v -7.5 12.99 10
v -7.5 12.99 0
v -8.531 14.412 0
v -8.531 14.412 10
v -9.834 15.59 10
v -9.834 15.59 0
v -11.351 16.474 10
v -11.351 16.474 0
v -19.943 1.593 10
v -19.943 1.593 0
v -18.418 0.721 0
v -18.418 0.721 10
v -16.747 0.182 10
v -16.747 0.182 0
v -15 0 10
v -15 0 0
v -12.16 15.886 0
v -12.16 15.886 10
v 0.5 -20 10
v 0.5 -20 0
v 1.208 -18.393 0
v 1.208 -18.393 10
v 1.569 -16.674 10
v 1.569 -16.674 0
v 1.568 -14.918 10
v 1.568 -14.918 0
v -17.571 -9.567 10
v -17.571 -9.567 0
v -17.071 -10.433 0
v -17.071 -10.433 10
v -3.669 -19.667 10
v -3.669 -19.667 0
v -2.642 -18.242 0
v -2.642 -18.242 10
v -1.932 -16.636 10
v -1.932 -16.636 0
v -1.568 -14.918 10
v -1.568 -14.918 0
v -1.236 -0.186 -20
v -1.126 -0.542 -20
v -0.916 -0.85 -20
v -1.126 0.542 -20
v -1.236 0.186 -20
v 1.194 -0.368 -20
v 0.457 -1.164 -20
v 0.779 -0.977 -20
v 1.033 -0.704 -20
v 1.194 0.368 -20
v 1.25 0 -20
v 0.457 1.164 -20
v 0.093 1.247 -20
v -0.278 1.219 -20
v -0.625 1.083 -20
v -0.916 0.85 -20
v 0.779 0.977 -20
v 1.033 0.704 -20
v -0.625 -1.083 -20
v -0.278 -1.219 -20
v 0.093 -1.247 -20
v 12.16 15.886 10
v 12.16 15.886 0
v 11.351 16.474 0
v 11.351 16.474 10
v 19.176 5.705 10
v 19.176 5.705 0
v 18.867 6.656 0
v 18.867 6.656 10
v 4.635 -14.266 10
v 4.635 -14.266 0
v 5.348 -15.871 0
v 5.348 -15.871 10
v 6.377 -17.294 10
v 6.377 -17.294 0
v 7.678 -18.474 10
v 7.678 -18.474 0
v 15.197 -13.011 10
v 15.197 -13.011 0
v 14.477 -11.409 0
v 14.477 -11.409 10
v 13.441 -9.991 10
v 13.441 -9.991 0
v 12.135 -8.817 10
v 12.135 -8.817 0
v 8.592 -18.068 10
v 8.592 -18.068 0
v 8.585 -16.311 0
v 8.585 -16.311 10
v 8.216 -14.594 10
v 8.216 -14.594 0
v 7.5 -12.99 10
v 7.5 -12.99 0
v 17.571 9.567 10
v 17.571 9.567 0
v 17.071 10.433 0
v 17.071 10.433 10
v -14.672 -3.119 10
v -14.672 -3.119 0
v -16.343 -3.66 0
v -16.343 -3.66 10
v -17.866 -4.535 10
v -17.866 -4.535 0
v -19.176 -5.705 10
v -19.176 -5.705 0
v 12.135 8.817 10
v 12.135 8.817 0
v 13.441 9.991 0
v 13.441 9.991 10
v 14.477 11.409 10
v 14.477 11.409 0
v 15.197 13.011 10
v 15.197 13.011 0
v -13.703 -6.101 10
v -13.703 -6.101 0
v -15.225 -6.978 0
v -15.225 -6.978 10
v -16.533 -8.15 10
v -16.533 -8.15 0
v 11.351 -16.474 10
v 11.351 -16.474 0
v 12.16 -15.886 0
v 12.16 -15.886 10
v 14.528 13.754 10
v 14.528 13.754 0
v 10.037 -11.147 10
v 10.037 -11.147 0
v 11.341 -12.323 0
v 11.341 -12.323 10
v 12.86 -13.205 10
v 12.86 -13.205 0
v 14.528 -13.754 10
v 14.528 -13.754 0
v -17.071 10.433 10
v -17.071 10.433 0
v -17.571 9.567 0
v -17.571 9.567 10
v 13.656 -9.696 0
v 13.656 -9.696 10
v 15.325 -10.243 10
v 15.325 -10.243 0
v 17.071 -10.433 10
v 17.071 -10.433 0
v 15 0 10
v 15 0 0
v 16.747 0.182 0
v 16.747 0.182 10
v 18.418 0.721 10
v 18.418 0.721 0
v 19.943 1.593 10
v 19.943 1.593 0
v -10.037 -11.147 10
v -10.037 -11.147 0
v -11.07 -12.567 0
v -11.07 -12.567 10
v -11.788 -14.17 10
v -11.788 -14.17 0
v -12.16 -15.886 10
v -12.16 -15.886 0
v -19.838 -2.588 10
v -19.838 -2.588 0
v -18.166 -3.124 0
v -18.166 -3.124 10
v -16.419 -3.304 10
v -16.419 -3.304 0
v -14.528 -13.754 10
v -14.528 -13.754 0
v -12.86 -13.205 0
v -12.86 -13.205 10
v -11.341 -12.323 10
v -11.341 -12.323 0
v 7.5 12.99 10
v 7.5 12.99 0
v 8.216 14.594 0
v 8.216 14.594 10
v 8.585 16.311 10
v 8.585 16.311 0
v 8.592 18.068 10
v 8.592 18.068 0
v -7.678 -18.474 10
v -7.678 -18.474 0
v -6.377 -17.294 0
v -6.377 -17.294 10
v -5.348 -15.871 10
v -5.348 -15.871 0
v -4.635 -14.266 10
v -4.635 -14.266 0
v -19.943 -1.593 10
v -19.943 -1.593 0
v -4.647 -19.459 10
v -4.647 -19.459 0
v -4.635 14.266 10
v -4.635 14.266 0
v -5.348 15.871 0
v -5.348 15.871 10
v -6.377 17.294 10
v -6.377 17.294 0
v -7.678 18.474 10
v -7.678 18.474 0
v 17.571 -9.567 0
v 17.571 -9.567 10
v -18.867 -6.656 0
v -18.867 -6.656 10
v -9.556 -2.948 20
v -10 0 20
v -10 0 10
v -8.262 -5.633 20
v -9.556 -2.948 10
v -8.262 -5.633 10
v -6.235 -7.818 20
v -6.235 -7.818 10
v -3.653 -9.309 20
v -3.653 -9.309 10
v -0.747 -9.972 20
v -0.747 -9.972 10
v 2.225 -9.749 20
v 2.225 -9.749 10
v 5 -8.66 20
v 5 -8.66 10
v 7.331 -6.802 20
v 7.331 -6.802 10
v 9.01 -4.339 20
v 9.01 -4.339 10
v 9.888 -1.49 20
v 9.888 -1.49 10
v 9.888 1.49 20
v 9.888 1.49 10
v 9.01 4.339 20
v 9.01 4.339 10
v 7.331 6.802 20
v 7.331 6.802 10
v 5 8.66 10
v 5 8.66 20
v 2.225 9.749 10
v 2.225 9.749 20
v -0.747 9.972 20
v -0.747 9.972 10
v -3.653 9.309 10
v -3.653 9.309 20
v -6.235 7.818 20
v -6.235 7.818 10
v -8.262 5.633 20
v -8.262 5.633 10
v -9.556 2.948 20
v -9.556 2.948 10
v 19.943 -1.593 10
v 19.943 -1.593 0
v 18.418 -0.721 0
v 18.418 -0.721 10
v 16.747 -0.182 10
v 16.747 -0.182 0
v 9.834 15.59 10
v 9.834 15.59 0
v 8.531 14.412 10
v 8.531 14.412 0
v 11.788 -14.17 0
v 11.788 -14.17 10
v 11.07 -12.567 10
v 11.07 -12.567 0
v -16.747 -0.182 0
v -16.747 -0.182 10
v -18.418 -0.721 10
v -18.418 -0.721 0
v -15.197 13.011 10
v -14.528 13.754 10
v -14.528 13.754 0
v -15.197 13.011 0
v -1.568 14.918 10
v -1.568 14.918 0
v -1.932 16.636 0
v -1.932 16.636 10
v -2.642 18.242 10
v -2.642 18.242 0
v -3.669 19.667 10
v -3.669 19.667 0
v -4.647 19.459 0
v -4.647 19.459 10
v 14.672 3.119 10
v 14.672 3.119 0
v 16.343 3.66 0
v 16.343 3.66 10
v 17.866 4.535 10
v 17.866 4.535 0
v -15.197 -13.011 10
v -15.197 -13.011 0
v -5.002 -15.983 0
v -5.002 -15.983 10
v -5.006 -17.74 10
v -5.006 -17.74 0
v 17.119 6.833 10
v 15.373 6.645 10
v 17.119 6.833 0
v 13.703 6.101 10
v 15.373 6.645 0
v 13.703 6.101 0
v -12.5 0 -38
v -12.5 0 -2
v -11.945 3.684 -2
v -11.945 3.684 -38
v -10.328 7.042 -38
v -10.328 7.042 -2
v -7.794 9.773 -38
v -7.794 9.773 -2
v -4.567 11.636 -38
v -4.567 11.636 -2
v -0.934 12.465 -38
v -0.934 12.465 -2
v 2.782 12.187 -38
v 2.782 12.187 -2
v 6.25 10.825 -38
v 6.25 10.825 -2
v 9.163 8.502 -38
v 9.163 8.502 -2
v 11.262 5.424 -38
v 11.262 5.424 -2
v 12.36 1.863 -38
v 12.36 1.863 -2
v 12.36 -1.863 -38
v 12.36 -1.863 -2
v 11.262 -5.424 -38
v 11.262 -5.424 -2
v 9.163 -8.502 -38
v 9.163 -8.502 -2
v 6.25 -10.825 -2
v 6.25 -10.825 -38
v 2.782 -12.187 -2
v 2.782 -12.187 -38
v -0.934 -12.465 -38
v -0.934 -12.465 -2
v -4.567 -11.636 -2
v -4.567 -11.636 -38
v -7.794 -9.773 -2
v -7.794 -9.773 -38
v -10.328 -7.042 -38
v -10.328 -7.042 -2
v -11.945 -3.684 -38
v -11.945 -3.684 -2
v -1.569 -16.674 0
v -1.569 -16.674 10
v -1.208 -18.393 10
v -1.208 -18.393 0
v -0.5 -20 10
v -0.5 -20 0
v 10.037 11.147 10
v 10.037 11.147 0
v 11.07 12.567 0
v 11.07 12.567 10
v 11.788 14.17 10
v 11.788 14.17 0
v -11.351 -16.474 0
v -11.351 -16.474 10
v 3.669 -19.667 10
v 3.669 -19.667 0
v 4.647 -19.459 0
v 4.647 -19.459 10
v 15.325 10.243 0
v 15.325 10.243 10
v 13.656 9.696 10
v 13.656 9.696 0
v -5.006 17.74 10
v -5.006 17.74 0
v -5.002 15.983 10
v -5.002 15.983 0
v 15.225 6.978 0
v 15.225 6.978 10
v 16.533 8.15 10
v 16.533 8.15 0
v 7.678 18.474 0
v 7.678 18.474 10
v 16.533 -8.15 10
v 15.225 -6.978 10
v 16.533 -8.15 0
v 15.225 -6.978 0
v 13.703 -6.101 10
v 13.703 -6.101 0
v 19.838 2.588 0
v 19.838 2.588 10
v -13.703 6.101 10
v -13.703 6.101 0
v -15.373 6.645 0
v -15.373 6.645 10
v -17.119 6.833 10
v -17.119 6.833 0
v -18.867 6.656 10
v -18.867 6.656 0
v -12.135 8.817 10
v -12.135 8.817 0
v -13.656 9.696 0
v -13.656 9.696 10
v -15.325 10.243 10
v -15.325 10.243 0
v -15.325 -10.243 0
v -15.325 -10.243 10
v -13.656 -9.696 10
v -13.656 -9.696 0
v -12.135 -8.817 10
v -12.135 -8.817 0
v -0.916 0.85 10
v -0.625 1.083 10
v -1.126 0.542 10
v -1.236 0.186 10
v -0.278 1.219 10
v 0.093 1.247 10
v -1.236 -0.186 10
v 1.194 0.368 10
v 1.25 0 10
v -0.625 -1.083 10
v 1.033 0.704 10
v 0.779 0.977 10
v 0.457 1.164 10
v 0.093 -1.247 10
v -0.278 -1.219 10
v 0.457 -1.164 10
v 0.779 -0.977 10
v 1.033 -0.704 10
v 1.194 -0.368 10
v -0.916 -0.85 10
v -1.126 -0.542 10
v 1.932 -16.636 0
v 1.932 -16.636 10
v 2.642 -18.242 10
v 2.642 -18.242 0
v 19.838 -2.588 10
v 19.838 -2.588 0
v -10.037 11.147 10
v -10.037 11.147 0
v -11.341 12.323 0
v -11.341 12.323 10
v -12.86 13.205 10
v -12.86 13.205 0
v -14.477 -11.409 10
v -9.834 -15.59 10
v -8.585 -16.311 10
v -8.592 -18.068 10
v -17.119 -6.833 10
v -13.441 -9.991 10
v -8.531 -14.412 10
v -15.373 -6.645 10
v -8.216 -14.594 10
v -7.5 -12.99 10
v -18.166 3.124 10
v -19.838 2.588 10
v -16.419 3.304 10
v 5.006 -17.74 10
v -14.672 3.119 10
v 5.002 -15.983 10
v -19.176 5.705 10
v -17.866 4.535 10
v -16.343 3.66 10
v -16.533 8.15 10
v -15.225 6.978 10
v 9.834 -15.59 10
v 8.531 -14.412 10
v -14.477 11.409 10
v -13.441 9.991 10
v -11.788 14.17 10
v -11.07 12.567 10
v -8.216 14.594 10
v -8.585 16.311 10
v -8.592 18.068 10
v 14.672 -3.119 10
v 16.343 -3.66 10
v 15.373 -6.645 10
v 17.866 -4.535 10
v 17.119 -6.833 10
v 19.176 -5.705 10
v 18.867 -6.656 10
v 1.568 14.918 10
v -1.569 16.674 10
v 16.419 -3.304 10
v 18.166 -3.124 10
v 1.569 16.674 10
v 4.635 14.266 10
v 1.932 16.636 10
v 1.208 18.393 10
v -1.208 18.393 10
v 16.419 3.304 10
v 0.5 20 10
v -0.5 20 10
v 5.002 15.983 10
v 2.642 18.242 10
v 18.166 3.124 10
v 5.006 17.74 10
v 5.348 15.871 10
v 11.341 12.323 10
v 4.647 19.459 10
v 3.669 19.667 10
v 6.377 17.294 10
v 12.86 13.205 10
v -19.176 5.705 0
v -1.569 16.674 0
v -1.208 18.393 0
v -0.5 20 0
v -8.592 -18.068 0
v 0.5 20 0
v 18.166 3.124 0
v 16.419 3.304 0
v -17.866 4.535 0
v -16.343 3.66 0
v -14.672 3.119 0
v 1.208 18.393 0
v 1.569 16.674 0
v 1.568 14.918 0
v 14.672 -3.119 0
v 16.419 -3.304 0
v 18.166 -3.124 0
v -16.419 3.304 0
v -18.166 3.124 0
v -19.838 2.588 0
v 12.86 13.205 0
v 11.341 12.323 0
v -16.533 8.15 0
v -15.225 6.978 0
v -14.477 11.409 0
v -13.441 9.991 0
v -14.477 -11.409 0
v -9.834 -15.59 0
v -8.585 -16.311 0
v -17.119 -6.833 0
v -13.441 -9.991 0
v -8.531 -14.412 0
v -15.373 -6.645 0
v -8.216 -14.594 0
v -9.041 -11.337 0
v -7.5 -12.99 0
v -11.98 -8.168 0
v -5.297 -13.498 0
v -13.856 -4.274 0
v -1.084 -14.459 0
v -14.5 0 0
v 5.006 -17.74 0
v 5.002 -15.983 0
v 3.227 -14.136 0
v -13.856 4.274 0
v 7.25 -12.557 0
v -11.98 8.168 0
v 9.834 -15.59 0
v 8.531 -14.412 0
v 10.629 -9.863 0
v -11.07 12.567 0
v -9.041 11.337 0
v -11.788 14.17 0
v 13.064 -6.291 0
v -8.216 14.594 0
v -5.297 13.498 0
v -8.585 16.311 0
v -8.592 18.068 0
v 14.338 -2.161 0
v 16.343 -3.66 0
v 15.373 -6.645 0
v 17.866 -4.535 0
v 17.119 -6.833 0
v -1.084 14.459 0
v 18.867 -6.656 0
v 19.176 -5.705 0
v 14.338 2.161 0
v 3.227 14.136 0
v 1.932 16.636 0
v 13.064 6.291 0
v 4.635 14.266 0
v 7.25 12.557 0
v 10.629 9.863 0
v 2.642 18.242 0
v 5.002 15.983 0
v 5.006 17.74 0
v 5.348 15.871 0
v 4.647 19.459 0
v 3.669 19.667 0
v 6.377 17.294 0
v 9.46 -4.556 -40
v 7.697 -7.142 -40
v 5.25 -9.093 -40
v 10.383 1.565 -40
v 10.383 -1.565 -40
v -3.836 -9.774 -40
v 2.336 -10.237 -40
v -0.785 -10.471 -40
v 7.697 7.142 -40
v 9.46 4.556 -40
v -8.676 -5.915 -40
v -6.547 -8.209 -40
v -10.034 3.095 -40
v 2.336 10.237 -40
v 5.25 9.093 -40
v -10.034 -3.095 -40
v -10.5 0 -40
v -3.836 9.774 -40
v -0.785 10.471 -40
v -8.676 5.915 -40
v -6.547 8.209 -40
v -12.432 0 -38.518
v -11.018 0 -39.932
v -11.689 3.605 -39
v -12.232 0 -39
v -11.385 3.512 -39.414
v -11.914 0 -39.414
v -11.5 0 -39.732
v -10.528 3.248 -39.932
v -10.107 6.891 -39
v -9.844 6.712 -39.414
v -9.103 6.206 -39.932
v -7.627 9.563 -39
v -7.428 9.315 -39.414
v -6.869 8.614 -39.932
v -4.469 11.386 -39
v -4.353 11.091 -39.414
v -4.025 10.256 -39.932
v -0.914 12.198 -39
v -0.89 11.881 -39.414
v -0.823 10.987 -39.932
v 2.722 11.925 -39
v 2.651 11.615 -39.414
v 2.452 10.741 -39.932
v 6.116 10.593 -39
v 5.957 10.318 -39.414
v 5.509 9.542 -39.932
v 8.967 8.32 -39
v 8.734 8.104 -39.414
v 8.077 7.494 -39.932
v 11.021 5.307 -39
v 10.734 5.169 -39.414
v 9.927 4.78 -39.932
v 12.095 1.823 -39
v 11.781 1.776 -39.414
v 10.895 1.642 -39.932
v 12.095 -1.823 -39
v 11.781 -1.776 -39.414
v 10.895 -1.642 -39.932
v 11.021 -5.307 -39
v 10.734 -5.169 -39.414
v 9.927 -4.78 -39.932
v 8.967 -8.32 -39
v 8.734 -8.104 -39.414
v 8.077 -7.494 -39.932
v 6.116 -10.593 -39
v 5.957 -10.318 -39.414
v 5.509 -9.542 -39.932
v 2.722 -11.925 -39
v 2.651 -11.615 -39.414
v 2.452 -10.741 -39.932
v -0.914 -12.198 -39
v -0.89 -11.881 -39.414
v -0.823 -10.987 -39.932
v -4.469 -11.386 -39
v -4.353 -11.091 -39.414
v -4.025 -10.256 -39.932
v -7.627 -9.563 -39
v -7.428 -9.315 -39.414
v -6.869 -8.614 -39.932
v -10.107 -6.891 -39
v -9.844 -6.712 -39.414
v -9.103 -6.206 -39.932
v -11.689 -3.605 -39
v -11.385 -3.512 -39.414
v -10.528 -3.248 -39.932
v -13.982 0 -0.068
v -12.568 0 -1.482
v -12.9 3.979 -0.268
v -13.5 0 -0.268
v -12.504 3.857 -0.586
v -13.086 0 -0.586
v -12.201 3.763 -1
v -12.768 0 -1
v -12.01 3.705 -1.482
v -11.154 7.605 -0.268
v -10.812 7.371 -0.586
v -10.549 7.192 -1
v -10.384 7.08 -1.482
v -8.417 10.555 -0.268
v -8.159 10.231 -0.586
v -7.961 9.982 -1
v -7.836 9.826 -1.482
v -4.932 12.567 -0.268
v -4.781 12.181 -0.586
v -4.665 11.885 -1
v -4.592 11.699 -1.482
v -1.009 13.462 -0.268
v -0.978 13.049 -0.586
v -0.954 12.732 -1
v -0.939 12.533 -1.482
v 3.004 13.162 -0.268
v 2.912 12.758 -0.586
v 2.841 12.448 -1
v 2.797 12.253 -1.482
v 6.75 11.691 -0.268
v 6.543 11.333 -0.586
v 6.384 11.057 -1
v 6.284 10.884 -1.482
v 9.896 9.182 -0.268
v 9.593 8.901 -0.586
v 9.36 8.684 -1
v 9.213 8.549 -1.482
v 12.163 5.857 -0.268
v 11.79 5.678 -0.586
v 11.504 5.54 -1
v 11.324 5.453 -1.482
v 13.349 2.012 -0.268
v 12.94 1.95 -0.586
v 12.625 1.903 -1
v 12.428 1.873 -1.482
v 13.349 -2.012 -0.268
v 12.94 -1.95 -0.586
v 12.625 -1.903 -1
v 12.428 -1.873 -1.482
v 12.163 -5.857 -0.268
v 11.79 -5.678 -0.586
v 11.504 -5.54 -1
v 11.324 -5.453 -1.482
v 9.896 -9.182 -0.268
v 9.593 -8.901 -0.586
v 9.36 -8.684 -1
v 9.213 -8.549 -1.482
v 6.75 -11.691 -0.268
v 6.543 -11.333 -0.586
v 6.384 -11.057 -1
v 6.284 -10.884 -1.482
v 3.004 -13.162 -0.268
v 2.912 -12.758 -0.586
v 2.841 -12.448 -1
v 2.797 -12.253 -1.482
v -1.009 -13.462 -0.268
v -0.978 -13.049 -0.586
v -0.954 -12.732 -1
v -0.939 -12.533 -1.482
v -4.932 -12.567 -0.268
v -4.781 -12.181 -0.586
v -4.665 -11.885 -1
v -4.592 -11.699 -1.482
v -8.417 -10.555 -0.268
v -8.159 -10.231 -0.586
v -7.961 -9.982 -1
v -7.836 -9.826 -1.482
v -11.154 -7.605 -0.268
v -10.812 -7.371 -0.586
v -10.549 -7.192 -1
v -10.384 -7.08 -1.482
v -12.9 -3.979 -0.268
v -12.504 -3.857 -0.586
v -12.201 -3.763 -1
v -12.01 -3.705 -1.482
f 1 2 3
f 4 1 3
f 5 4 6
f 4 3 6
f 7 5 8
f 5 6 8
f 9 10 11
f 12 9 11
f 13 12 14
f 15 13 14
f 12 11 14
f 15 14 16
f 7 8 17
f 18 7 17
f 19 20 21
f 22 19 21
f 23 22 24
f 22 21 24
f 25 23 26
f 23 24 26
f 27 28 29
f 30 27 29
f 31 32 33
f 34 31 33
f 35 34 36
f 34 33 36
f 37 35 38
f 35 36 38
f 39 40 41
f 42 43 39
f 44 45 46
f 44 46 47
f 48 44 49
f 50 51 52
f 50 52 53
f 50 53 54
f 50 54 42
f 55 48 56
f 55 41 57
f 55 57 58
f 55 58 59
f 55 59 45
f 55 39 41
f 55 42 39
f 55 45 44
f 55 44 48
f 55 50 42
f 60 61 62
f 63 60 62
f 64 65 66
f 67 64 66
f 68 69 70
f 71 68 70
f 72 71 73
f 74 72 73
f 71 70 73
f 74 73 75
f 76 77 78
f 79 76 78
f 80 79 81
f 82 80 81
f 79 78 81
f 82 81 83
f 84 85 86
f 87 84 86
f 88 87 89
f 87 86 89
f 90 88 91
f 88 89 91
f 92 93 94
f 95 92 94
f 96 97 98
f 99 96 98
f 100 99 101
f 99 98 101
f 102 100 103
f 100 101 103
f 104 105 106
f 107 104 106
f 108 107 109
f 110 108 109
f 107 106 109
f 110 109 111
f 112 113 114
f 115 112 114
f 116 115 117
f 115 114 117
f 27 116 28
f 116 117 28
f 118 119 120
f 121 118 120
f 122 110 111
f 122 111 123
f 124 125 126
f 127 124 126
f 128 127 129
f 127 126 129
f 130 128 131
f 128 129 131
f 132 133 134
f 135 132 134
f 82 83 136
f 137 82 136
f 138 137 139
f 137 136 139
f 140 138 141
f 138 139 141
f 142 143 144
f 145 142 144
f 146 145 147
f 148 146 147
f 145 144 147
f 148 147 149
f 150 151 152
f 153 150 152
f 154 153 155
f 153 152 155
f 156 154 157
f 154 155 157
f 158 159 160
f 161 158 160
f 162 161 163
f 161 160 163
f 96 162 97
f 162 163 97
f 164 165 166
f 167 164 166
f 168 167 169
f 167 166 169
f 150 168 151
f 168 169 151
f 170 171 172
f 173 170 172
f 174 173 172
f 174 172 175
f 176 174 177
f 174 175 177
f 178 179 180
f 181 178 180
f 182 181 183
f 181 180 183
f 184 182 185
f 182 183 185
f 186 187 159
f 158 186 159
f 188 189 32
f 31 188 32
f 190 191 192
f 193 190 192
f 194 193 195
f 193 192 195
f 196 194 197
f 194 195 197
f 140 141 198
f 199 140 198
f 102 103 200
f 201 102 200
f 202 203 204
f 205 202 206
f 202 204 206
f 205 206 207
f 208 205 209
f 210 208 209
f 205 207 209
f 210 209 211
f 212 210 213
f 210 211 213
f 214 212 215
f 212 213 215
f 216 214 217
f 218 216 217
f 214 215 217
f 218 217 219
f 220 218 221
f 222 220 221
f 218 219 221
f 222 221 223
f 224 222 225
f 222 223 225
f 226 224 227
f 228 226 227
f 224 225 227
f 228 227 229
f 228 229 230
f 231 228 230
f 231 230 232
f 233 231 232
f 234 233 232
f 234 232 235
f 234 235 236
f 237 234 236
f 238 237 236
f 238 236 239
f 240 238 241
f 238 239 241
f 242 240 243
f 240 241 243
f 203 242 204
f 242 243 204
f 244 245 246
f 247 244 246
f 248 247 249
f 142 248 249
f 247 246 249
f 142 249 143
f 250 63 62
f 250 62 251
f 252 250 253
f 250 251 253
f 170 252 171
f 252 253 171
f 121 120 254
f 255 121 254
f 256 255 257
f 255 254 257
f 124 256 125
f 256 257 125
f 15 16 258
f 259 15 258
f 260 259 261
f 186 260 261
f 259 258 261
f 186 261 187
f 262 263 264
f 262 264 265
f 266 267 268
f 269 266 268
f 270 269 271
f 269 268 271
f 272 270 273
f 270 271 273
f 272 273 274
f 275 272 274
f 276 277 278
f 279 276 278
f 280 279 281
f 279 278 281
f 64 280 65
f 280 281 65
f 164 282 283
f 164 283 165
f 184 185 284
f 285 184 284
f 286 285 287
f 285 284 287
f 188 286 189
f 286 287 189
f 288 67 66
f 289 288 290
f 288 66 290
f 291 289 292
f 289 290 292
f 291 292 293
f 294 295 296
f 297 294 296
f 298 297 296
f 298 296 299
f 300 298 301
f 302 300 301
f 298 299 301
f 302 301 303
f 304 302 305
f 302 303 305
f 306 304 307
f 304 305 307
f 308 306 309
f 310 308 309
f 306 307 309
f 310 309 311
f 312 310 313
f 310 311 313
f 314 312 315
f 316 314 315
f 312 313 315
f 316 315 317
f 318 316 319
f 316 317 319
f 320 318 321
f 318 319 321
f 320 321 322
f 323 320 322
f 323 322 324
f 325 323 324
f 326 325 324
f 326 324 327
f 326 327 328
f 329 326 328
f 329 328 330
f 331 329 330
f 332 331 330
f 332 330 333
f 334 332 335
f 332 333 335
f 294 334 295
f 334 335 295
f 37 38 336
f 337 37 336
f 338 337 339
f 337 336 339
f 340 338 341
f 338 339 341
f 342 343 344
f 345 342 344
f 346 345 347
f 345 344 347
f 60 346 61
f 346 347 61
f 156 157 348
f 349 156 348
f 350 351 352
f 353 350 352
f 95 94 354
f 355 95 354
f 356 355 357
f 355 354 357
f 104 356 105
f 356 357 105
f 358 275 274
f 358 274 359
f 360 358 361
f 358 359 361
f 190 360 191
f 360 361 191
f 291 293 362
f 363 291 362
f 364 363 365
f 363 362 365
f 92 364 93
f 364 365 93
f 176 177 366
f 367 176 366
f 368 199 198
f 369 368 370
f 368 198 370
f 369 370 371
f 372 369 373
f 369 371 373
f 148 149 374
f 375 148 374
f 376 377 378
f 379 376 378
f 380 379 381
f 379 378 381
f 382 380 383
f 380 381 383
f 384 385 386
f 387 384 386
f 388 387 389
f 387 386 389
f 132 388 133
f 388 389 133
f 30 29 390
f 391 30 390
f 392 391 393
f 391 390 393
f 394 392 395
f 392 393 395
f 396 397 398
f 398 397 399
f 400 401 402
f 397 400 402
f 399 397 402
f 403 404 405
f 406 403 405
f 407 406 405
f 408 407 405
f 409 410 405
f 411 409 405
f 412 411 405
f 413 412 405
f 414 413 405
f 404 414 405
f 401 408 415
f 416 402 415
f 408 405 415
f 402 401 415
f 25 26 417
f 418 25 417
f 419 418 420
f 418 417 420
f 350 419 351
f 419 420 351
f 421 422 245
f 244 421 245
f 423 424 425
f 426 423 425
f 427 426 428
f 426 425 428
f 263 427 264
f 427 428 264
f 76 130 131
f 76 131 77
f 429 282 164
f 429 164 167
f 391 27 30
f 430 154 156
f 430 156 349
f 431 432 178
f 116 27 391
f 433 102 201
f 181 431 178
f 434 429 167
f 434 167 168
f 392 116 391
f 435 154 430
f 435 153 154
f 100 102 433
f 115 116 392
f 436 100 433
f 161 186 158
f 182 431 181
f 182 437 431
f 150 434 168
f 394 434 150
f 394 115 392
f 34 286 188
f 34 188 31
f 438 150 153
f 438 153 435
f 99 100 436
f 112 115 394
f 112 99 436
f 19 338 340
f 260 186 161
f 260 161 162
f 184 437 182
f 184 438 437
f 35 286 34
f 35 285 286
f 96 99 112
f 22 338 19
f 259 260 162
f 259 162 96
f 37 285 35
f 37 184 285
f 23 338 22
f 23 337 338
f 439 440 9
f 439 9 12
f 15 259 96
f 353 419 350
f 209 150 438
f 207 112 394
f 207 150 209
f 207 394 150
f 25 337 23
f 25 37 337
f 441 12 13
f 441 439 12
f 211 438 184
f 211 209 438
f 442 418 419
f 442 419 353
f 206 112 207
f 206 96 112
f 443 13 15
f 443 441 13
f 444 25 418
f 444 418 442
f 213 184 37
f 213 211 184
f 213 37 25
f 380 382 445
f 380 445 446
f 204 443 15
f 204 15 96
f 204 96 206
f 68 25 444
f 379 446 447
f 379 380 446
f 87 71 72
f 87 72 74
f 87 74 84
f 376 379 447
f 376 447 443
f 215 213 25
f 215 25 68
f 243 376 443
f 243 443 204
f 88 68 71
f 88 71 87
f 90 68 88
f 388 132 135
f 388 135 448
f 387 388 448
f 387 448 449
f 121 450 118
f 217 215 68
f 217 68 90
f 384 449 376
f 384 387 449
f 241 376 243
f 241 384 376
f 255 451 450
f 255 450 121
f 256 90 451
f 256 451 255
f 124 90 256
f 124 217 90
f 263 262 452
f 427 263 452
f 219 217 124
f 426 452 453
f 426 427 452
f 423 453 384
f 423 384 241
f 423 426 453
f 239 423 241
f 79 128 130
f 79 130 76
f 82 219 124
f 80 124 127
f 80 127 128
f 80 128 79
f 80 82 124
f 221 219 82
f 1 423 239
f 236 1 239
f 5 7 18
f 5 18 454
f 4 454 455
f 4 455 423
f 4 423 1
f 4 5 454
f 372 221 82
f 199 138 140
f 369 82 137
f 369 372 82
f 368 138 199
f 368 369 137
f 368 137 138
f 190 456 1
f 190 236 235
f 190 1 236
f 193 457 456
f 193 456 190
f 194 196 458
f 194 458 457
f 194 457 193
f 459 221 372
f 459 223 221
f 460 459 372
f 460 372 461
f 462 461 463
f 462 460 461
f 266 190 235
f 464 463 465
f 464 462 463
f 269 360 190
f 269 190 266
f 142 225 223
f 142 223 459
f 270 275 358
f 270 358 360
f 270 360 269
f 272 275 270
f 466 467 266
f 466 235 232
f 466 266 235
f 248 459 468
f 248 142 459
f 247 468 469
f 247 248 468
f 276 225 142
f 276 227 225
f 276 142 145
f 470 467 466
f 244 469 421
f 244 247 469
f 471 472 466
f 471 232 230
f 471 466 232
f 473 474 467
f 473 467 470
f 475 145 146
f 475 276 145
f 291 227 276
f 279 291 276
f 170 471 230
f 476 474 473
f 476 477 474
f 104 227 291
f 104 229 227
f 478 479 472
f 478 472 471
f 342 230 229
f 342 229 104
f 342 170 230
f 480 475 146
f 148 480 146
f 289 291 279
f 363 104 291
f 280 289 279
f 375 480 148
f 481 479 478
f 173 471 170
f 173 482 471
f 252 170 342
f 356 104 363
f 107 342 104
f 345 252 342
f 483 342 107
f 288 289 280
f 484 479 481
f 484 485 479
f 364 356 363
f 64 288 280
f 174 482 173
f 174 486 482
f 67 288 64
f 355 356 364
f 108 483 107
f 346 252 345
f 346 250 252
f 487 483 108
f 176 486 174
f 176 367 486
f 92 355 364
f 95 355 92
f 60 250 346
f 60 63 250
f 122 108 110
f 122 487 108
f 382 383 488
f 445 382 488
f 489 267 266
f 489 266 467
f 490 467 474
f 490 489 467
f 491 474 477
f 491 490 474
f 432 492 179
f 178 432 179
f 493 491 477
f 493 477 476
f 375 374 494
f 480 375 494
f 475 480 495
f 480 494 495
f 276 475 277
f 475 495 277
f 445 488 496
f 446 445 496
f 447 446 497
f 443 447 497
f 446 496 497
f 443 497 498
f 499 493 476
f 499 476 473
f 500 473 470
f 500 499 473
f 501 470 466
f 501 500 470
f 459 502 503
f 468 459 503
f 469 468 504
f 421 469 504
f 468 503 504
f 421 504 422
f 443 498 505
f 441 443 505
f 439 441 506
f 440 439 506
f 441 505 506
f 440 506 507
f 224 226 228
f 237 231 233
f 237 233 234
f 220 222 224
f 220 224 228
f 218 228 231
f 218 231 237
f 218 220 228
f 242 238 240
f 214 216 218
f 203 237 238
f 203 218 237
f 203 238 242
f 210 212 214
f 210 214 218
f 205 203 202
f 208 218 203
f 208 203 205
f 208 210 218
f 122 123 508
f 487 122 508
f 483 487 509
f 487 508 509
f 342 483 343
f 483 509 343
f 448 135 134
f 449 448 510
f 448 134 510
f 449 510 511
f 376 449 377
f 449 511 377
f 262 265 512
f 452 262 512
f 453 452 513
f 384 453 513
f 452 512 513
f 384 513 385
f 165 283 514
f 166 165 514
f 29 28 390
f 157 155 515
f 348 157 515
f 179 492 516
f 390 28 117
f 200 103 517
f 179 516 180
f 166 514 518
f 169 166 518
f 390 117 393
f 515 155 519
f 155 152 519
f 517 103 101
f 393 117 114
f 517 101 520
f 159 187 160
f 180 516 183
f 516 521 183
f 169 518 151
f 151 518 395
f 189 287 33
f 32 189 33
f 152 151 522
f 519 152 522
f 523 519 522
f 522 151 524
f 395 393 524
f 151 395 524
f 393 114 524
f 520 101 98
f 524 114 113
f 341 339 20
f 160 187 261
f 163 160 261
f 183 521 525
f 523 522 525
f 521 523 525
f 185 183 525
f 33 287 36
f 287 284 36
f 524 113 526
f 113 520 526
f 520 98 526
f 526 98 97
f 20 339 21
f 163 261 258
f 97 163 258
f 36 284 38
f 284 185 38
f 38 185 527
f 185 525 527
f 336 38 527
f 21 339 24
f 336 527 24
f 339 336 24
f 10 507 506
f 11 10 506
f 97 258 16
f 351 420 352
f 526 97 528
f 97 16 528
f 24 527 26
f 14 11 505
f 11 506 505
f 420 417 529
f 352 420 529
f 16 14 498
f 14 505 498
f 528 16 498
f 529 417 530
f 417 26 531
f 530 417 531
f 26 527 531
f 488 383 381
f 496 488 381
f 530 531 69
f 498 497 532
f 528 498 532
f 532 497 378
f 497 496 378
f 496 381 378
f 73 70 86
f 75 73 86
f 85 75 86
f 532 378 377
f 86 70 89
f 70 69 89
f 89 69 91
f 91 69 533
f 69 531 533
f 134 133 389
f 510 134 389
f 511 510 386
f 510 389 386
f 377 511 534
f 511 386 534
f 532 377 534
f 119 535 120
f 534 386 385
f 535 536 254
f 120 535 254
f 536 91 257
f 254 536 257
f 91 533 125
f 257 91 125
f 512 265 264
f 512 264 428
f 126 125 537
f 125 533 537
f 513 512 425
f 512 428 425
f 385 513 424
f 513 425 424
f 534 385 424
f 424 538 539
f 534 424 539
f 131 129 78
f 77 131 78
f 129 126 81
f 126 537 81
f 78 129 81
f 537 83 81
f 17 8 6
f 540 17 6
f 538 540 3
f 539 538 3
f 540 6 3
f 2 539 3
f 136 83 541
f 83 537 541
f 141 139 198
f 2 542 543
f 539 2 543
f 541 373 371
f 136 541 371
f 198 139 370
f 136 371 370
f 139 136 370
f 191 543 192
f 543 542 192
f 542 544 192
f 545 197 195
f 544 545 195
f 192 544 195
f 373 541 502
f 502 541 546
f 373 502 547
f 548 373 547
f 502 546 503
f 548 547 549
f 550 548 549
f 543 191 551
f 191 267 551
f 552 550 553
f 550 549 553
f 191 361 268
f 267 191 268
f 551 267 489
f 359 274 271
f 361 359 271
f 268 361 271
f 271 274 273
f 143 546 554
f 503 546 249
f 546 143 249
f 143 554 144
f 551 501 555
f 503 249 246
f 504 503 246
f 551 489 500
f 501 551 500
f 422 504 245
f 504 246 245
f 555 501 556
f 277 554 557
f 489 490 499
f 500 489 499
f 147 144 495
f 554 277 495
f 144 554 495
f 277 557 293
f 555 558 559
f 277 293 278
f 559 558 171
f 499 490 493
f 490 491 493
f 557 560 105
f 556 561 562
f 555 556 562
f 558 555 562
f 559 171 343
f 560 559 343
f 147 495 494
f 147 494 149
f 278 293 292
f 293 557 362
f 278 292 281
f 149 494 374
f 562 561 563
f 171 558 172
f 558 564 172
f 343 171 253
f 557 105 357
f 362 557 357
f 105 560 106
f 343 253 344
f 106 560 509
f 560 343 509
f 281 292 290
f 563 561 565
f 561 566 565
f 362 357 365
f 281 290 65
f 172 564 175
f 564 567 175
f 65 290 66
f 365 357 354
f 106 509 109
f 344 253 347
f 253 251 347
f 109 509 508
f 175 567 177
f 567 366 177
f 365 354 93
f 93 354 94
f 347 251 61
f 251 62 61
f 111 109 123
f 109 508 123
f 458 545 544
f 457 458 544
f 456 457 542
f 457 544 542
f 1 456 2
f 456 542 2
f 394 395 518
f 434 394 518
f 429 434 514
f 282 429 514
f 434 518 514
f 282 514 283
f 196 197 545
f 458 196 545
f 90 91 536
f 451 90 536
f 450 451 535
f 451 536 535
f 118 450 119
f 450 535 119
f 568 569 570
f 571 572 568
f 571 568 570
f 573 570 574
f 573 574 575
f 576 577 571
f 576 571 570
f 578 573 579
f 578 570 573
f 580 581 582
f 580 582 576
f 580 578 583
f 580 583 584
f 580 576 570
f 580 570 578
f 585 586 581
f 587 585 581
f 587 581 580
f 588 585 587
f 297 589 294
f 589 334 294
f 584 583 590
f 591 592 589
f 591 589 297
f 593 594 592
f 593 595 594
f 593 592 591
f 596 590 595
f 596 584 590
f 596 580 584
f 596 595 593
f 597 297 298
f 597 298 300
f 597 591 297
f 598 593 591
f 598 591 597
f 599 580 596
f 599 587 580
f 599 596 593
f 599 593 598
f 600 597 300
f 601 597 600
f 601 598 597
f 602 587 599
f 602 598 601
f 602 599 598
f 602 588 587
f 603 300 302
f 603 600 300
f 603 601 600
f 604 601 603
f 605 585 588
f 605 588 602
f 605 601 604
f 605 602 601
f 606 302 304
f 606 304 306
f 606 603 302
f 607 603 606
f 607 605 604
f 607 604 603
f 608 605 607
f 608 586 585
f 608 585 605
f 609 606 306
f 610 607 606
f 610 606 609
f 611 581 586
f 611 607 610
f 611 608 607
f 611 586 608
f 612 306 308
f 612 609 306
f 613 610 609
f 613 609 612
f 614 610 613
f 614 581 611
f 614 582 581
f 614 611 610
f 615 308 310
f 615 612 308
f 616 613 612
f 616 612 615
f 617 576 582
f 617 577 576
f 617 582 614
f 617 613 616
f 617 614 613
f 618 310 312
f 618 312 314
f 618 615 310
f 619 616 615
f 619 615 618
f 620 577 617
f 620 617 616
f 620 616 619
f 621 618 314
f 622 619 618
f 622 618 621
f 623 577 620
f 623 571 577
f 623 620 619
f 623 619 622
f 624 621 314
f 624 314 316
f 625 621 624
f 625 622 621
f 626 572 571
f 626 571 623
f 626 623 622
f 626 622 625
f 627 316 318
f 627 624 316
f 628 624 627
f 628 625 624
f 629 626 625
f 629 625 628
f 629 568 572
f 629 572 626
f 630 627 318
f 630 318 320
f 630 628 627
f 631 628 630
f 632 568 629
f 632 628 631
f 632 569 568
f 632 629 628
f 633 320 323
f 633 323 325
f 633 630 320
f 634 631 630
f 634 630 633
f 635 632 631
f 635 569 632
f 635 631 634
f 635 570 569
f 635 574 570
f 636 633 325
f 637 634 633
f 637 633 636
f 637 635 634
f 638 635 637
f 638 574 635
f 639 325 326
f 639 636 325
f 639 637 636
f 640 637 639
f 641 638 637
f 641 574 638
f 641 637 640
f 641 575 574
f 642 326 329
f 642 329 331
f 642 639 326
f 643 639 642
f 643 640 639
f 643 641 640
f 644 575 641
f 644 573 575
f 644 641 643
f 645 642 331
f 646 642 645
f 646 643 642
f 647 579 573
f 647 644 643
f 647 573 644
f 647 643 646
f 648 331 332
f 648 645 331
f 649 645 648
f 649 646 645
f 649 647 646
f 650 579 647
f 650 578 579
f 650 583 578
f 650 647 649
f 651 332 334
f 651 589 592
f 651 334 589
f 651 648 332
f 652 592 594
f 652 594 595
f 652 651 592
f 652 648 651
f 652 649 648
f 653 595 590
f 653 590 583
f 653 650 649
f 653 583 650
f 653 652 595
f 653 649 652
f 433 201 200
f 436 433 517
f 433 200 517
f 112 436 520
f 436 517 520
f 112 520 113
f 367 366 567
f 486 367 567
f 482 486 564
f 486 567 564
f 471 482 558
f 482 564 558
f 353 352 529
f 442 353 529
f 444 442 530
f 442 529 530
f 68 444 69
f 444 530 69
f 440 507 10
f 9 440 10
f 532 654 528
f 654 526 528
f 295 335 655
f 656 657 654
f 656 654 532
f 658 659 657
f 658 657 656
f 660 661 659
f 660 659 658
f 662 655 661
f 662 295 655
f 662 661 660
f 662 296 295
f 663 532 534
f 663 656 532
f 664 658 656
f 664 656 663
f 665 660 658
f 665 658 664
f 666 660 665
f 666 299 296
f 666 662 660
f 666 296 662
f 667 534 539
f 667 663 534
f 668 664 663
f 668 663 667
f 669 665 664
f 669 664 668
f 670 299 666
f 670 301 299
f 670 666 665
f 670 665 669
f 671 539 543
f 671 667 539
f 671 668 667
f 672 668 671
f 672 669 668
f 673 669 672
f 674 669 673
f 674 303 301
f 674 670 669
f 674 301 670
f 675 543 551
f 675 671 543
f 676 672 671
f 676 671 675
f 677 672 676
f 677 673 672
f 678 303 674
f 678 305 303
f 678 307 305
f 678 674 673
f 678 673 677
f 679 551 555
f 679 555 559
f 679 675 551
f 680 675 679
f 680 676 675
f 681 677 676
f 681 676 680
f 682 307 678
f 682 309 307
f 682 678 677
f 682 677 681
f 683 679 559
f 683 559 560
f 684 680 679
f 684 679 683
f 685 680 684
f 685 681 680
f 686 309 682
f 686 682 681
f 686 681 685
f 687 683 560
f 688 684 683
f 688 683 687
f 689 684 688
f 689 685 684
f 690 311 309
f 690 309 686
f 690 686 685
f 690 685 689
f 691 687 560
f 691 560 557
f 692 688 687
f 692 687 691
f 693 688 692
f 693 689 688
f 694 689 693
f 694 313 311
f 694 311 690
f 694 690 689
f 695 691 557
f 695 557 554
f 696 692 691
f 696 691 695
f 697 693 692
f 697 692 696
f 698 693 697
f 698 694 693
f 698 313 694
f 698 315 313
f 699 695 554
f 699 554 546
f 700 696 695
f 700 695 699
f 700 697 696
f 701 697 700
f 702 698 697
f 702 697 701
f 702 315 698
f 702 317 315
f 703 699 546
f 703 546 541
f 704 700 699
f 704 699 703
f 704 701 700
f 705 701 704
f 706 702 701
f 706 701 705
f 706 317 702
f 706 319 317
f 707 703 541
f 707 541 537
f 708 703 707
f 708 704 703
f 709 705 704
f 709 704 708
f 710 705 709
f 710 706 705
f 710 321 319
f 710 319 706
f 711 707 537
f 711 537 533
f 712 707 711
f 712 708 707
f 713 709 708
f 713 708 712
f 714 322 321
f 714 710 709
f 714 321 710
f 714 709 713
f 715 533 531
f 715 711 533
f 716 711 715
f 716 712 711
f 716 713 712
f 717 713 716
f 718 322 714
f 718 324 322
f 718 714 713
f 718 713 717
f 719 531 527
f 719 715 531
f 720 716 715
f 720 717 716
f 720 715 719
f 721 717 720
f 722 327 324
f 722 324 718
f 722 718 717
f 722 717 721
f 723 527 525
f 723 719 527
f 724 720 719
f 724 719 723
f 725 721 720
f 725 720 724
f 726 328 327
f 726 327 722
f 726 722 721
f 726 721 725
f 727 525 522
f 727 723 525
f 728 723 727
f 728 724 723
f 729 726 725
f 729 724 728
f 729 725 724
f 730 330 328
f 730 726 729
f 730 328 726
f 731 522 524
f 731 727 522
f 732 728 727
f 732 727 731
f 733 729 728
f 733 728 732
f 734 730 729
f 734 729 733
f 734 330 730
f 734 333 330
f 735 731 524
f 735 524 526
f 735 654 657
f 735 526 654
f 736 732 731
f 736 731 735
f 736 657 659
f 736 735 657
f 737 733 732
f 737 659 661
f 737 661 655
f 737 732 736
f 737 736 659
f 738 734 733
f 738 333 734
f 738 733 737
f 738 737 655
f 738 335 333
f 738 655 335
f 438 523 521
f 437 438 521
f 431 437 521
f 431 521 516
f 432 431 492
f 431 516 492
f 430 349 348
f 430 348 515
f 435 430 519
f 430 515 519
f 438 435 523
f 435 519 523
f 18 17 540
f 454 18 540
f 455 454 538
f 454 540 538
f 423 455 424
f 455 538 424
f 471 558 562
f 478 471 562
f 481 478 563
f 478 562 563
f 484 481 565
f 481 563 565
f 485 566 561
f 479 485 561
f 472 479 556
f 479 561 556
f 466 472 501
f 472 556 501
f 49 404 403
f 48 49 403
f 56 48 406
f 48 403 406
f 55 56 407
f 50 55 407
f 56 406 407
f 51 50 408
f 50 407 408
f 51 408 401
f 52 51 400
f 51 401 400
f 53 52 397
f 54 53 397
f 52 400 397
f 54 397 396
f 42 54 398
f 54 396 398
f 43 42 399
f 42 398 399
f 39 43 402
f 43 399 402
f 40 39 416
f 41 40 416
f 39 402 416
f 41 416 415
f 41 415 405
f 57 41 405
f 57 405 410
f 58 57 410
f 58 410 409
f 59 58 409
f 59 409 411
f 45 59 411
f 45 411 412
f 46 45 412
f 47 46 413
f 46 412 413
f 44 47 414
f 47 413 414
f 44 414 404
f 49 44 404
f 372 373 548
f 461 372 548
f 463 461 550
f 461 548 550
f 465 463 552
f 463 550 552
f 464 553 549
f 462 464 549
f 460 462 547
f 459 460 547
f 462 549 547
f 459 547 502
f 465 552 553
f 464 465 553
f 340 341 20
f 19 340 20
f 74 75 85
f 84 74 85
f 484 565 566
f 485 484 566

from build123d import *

# Parameters (mm, degrees)
SKETCH_1_R               = 15
EXTRUDE_1_DEPTH          = 10
SKETCH_2_R               = 12.5
EXTRUDE_2_DEPTH          = 40
FILLET_2_R               = 2
FILLET_3_R               = 2
SKETCH_3_R               = 1.25
CUT_EXTRUDE_1_DEPTH      = 30
EXTRUDE_START            = -10
EXTRUDE_3_DEPTH          = 10
PATTERN_CIRCULAR_1_DEPTH = 10
SKETCH_5_R               = 10
EXTRUDE_4_DEPTH          = 10


# Read off the part's stored shape, not the designer's step: 阵列(圆周)1
with BuildPart() as part:
    # 草图1 → 凸台-拉伸1 (new body)
    with BuildSketch(Plane.XY):
        Circle(SKETCH_1_R)
    extrude(amount=EXTRUDE_1_DEPTH)

    # 草图2 → 凸台-拉伸2 (add)
    with BuildSketch(Plane(origin=(0, 0, 0), x_dir=(-1, 0, 0), z_dir=(0, 0, -1))):
        Circle(SKETCH_2_R)
    extrude(amount=EXTRUDE_2_DEPTH)

    # 圆角2
    fillet_2_edges = [part.edges().sort_by_distance(p)[0] for p in [
        (12.5, 0, 0),
    ]]
    fillet(fillet_2_edges, radius=FILLET_2_R)

    # 圆角3
    fillet_3_edges = [part.edges().sort_by_distance(p)[0] for p in [
        (12.5, 0, -40),
    ]]
    fillet(fillet_3_edges, radius=FILLET_3_R)

    # 草图3 → 切除-拉伸1 (cut)
    with BuildSketch(Plane.XY.offset(10)):
        Circle(SKETCH_3_R)
    extrude(amount=-CUT_EXTRUDE_1_DEPTH, mode=Mode.SUBTRACT)

    # 草图4 → 凸台-拉伸3 (add)
    with BuildSketch(Plane.XY.offset(10).offset(EXTRUDE_START)):
        with BuildLine():
            Line((-0.5, 20), (0.5, 20))
            ThreePointArc((0.5, 20), (1.433409728, 17.542850661), (1.567926949, 14.917828431))
            ThreePointArc((1.567926949, 14.917828431), (0, 15), (-1.567926949, 14.917828431))
            ThreePointArc((-1.567926949, 14.917828431), (-1.433409728, 17.542850661), (-0.5, 20))
        make_face()
    extrude(amount=EXTRUDE_3_DEPTH)

    # 阵列(圆周)1 outline → 阵列(圆周)1 (add)
    with BuildSketch(Plane.XY):
        with BuildLine():
            ThreePointArc((-4.635254916, 14.265847745), (-3.118675363, 14.672214011), (-1.567926949, 14.917828431))
            ThreePointArc((-1.567926949, 14.917828431), (-2.245277457, 17.457519924), (-3.669160016, 19.66690786))
            Line((-3.669160016, 19.66690786), (-4.647307617, 19.458996169))
            ThreePointArc((-4.647307617, 19.458996169), (-5.049450029, 16.861474644), (-4.635254916, 14.265847745))
        make_face()
        with BuildLine():
            ThreePointArc((1.567926949, 14.917828431), (3.118675363, 14.672214011), (4.635254916, 14.265847745))
            ThreePointArc((4.635254916, 14.265847745), (5.049450029, 16.861474644), (4.647307617, 19.458996169))
            Line((4.647307617, 19.458996169), (3.669160016, 19.66690786))
            ThreePointArc((3.669160016, 19.66690786), (2.245277457, 17.457519924), (1.567926949, 14.917828431))
        make_face()
        with BuildLine():
            ThreePointArc((4.635254916, 14.265847745), (6.101049646, 13.703181865), (7.5, 12.990381057))
            ThreePointArc((7.5, 12.990381057), (8.444805133, 15.443171275), (8.59150559, 18.067540831))
            Line((8.59150559, 18.067540831), (7.677960133, 18.474277474))
            ThreePointArc((7.677960133, 18.474277474), (5.825835242, 16.609211796), (4.635254916, 14.265847745))
        make_face()
        with BuildLine():
            ThreePointArc((7.5, 12.990381057), (8.816778785, 12.135254916), (10.036959096, 11.147172383))
            ThreePointArc((10.036959096, 11.147172383), (11.471081731, 13.349927216), (12.160213543, 15.886447261))
            Line((12.160213543, 15.886447261), (11.351196549, 16.474232514))
            ThreePointArc((11.351196549, 16.474232514), (9.151776072, 15.035001413), (7.5, 12.990381057))
        make_face()
        with BuildLine():
            ThreePointArc((10.036959096, 11.147172383), (11.147172383, 10.036959096), (12.135254916, 8.816778784))
            ThreePointArc((12.135254916, 8.816778784), (13.996017013, 10.673227278), (15.197461813, 13.011039714))
            Line((15.197461813, 13.011039714), (14.528331206, 13.75418454))
            ThreePointArc((14.528331206, 13.75418454), (12.077740372, 12.803689322), (10.036959096, 11.147172383))
        make_face()
        with BuildLine():
            ThreePointArc((12.135254916, 8.816778784), (12.990381057, 7.5), (13.703181865, 6.101049646))
            ThreePointArc((13.703181865, 6.101049646), (15.909259191, 7.530056092), (17.570508076, 9.566987298))
            Line((17.570508076, 9.566987298), (17.070508076, 10.433012702))
            ThreePointArc((17.070508076, 10.433012702), (14.475849464, 10.012794569), (12.135254916, 8.816778784))
        make_face()
        with BuildLine():
            ThreePointArc((13.703181865, 6.101049646), (14.265847745, 4.635254915), (14.672214011, 3.118675362))
            ThreePointArc((14.672214011, 3.118675362), (17.127190401, 4.057785322), (19.175638823, 5.704811629))
            Line((19.175638823, 5.704811629), (18.866621829, 6.655868146))
            ThreePointArc((18.866621829, 6.655868146), (16.24129447, 6.784292646), (13.703181865, 6.101049646))
        make_face()
        with BuildLine():
            ThreePointArc((14.672214011, 3.118675362), (14.917828431, 1.567926949), (15, 0))
            ThreePointArc((15, 0), (17.596581206, 0.408169862), (19.942702139, 1.593308318))
            Line((19.942702139, 1.593308318), (19.838173676, 2.587830213))
            ThreePointArc((19.838173676, 2.587830213), (17.296916974, 3.25928458), (14.672214011, 3.118675362))
        make_face()
        with BuildLine():
            ThreePointArc((15, 0), (14.917828431, -1.567926949), (14.672214011, -3.118675362))
            ThreePointArc((14.672214011, -3.118675362), (17.296916974, -3.25928458), (19.838173676, -2.587830213))
            Line((19.838173676, -2.587830213), (19.942702139, -1.593308318))
            ThreePointArc((19.942702139, -1.593308318), (17.596581206, -0.408169862), (15, 0))
        make_face()
        with BuildLine():
            ThreePointArc((14.672214011, -3.118675362), (14.265847745, -4.635254915), (13.703181865, -6.101049646))
            ThreePointArc((13.703181865, -6.101049646), (16.24129447, -6.784292646), (18.866621829, -6.655868146))
            Line((18.866621829, -6.655868146), (19.175638823, -5.704811629))
            ThreePointArc((19.175638823, -5.704811629), (17.127190401, -4.057785322), (14.672214011, -3.118675362))
        make_face()
        with BuildLine():
            ThreePointArc((13.703181865, -6.101049646), (12.990381057, -7.5), (12.135254916, -8.816778784))
            ThreePointArc((12.135254916, -8.816778784), (14.475849464, -10.012794569), (17.070508076, -10.433012702))
            Line((17.070508076, -10.433012702), (17.570508076, -9.566987298))
            ThreePointArc((17.570508076, -9.566987298), (15.909259191, -7.530056092), (13.703181865, -6.101049646))
        make_face()
        with BuildLine():
            ThreePointArc((12.135254916, -8.816778784), (11.147172382, -10.036959095), (10.036959095, -11.147172382))
            ThreePointArc((10.036959095, -11.147172382), (12.077740372, -12.803689322), (14.528331206, -13.75418454))
            Line((14.528331206, -13.75418454), (15.197461813, -13.011039714))
            ThreePointArc((15.197461813, -13.011039714), (13.996017013, -10.673227278), (12.135254916, -8.816778784))
        make_face()
        with BuildLine():
            ThreePointArc((10.036959095, -11.147172382), (8.816778784, -12.135254916), (7.5, -12.990381057))
            ThreePointArc((7.5, -12.990381057), (9.151776072, -15.035001413), (11.351196549, -16.474232514))
            Line((11.351196549, -16.474232514), (12.160213543, -15.886447261))
            ThreePointArc((12.160213543, -15.886447261), (11.471081731, -13.349927216), (10.036959095, -11.147172382))
        make_face()
        with BuildLine():
            ThreePointArc((7.5, -12.990381057), (6.101049646, -13.703181865), (4.635254916, -14.265847744))
            ThreePointArc((4.635254916, -14.265847744), (5.825835242, -16.609211796), (7.677960133, -18.474277474))
            Line((7.677960133, -18.474277474), (8.59150559, -18.067540831))
            ThreePointArc((8.59150559, -18.067540831), (8.444805133, -15.443171275), (7.5, -12.990381057))
        make_face()
        with BuildLine():
            ThreePointArc((4.635254916, -14.265847744), (3.118675362, -14.672214011), (1.567926949, -14.917828431))
            ThreePointArc((1.567926949, -14.917828431), (2.245277457, -17.457519924), (3.669160016, -19.66690786))
            Line((3.669160016, -19.66690786), (4.647307617, -19.458996169))
            ThreePointArc((4.647307617, -19.458996169), (5.049450029, -16.861474644), (4.635254916, -14.265847744))
        make_face()
        with BuildLine():
            ThreePointArc((1.567926949, -14.917828431), (0, -15), (-1.567926949, -14.917828431))
            ThreePointArc((-1.567926949, -14.917828431), (-1.433409728, -17.542850661), (-0.5, -20))
            Line((-0.5, -20), (0.5, -20))
            ThreePointArc((0.5, -20), (1.433409728, -17.542850661), (1.567926949, -14.917828431))
        make_face()
        with BuildLine():
            ThreePointArc((-1.567926949, -14.917828431), (-3.118675362, -14.672214011), (-4.635254916, -14.265847744))
            ThreePointArc((-4.635254916, -14.265847744), (-5.049450029, -16.861474644), (-4.647307617, -19.458996169))
            Line((-4.647307617, -19.458996169), (-3.669160016, -19.66690786))
            ThreePointArc((-3.669160016, -19.66690786), (-2.245277457, -17.457519924), (-1.567926949, -14.917828431))
        make_face()
        with BuildLine():
            ThreePointArc((-4.635254916, -14.265847744), (-6.101049646, -13.703181865), (-7.5, -12.990381057))
            ThreePointArc((-7.5, -12.990381057), (-8.444805133, -15.443171275), (-8.59150559, -18.067540831))
            Line((-8.59150559, -18.067540831), (-7.677960133, -18.474277474))
            ThreePointArc((-7.677960133, -18.474277474), (-5.825835242, -16.609211796), (-4.635254916, -14.265847744))
        make_face()
        with BuildLine():
            ThreePointArc((-7.5, -12.990381057), (-8.816778784, -12.135254916), (-10.036959095, -11.147172382))
            ThreePointArc((-10.036959095, -11.147172382), (-11.471081731, -13.349927216), (-12.160213543, -15.886447261))
            Line((-12.160213543, -15.886447261), (-11.351196549, -16.474232514))
            ThreePointArc((-11.351196549, -16.474232514), (-9.151776072, -15.035001413), (-7.5, -12.990381057))
        make_face()
        with BuildLine():
            ThreePointArc((-10.036959095, -11.147172382), (-11.147172382, -10.036959095), (-12.135254916, -8.816778784))
            ThreePointArc((-12.135254916, -8.816778784), (-13.996017013, -10.673227278), (-15.197461813, -13.011039714))
            Line((-15.197461813, -13.011039714), (-14.528331206, -13.75418454))
            ThreePointArc((-14.528331206, -13.75418454), (-12.077740372, -12.803689322), (-10.036959095, -11.147172382))
        make_face()
        with BuildLine():
            ThreePointArc((-12.135254916, -8.816778784), (-12.990381057, -7.5), (-13.703181865, -6.101049646))
            ThreePointArc((-13.703181865, -6.101049646), (-15.909259191, -7.530056092), (-17.570508076, -9.566987298))
            Line((-17.570508076, -9.566987298), (-17.070508076, -10.433012702))
            ThreePointArc((-17.070508076, -10.433012702), (-14.475849464, -10.012794569), (-12.135254916, -8.816778784))
        make_face()
        with BuildLine():
            ThreePointArc((-13.703181865, -6.101049646), (-14.265847745, -4.635254915), (-14.672214011, -3.118675362))
            ThreePointArc((-14.672214011, -3.118675362), (-17.127190401, -4.057785322), (-19.175638823, -5.704811629))
            Line((-19.175638823, -5.704811629), (-18.866621829, -6.655868146))
            ThreePointArc((-18.866621829, -6.655868146), (-16.24129447, -6.784292646), (-13.703181865, -6.101049646))
        make_face()
        with BuildLine():
            ThreePointArc((-14.672214011, -3.118675362), (-14.917828431, -1.567926949), (-15, 0))
            ThreePointArc((-15, 0), (-17.596581206, -0.408169862), (-19.942702139, -1.593308318))
            Line((-19.942702139, -1.593308318), (-19.838173676, -2.587830213))
            ThreePointArc((-19.838173676, -2.587830213), (-17.296916974, -3.25928458), (-14.672214011, -3.118675362))
        make_face()
        with BuildLine():
            ThreePointArc((-15, 0), (-14.917828431, 1.567926949), (-14.672214011, 3.118675362))
            ThreePointArc((-14.672214011, 3.118675362), (-17.296916974, 3.25928458), (-19.838173676, 2.587830213))
            Line((-19.838173676, 2.587830213), (-19.942702139, 1.593308318))
            ThreePointArc((-19.942702139, 1.593308318), (-17.596581206, 0.408169862), (-15, 0))
        make_face()
        with BuildLine():
            ThreePointArc((-14.672214011, 3.118675362), (-14.265847745, 4.635254915), (-13.703181865, 6.101049646))
            ThreePointArc((-13.703181865, 6.101049646), (-16.24129447, 6.784292646), (-18.866621829, 6.655868146))
            Line((-18.866621829, 6.655868146), (-19.175638823, 5.704811629))
            ThreePointArc((-19.175638823, 5.704811629), (-17.127190401, 4.057785322), (-14.672214011, 3.118675362))
        make_face()
        with BuildLine():
            ThreePointArc((-13.703181865, 6.101049646), (-12.990381057, 7.5), (-12.135254916, 8.816778784))
            ThreePointArc((-12.135254916, 8.816778784), (-14.475849464, 10.012794569), (-17.070508076, 10.433012702))
            Line((-17.070508076, 10.433012702), (-17.570508076, 9.566987298))
            ThreePointArc((-17.570508076, 9.566987298), (-15.909259191, 7.530056092), (-13.703181865, 6.101049646))
        make_face()
        with BuildLine():
            ThreePointArc((-12.135254916, 8.816778784), (-11.147172383, 10.036959096), (-10.036959096, 11.147172383))
            ThreePointArc((-10.036959096, 11.147172383), (-12.077740372, 12.803689322), (-14.528331206, 13.75418454))
            Line((-14.528331206, 13.75418454), (-15.197461813, 13.011039714))
            ThreePointArc((-15.197461813, 13.011039714), (-13.996017013, 10.673227278), (-12.135254916, 8.816778784))
        make_face()
        with BuildLine():
            ThreePointArc((-10.036959096, 11.147172383), (-8.816778785, 12.135254916), (-7.5, 12.990381057))
            ThreePointArc((-7.5, 12.990381057), (-9.151776072, 15.035001413), (-11.351196549, 16.474232514))
            Line((-11.351196549, 16.474232514), (-12.160213543, 15.886447261))
            ThreePointArc((-12.160213543, 15.886447261), (-11.471081731, 13.349927216), (-10.036959096, 11.147172383))
        make_face()
        with BuildLine():
            ThreePointArc((-7.5, 12.990381057), (-6.101049646, 13.703181865), (-4.635254916, 14.265847745))
            ThreePointArc((-4.635254916, 14.265847745), (-5.825835242, 16.609211796), (-7.677960133, 18.474277474))
            Line((-7.677960133, 18.474277474), (-8.59150559, 18.067540831))
            ThreePointArc((-8.59150559, 18.067540831), (-8.444805133, 15.443171275), (-7.5, 12.990381057))
        make_face()
    extrude(amount=PATTERN_CIRCULAR_1_DEPTH)

    # 草图5 → 凸台-拉伸4 (add)
    with BuildSketch(Plane.XY.offset(10)):
        with Locations(Location((0, 0, 0), (0, 0, 180))):
            Circle(SKETCH_5_R)
    extrude(amount=EXTRUDE_4_DEPTH)


solid = part.part
